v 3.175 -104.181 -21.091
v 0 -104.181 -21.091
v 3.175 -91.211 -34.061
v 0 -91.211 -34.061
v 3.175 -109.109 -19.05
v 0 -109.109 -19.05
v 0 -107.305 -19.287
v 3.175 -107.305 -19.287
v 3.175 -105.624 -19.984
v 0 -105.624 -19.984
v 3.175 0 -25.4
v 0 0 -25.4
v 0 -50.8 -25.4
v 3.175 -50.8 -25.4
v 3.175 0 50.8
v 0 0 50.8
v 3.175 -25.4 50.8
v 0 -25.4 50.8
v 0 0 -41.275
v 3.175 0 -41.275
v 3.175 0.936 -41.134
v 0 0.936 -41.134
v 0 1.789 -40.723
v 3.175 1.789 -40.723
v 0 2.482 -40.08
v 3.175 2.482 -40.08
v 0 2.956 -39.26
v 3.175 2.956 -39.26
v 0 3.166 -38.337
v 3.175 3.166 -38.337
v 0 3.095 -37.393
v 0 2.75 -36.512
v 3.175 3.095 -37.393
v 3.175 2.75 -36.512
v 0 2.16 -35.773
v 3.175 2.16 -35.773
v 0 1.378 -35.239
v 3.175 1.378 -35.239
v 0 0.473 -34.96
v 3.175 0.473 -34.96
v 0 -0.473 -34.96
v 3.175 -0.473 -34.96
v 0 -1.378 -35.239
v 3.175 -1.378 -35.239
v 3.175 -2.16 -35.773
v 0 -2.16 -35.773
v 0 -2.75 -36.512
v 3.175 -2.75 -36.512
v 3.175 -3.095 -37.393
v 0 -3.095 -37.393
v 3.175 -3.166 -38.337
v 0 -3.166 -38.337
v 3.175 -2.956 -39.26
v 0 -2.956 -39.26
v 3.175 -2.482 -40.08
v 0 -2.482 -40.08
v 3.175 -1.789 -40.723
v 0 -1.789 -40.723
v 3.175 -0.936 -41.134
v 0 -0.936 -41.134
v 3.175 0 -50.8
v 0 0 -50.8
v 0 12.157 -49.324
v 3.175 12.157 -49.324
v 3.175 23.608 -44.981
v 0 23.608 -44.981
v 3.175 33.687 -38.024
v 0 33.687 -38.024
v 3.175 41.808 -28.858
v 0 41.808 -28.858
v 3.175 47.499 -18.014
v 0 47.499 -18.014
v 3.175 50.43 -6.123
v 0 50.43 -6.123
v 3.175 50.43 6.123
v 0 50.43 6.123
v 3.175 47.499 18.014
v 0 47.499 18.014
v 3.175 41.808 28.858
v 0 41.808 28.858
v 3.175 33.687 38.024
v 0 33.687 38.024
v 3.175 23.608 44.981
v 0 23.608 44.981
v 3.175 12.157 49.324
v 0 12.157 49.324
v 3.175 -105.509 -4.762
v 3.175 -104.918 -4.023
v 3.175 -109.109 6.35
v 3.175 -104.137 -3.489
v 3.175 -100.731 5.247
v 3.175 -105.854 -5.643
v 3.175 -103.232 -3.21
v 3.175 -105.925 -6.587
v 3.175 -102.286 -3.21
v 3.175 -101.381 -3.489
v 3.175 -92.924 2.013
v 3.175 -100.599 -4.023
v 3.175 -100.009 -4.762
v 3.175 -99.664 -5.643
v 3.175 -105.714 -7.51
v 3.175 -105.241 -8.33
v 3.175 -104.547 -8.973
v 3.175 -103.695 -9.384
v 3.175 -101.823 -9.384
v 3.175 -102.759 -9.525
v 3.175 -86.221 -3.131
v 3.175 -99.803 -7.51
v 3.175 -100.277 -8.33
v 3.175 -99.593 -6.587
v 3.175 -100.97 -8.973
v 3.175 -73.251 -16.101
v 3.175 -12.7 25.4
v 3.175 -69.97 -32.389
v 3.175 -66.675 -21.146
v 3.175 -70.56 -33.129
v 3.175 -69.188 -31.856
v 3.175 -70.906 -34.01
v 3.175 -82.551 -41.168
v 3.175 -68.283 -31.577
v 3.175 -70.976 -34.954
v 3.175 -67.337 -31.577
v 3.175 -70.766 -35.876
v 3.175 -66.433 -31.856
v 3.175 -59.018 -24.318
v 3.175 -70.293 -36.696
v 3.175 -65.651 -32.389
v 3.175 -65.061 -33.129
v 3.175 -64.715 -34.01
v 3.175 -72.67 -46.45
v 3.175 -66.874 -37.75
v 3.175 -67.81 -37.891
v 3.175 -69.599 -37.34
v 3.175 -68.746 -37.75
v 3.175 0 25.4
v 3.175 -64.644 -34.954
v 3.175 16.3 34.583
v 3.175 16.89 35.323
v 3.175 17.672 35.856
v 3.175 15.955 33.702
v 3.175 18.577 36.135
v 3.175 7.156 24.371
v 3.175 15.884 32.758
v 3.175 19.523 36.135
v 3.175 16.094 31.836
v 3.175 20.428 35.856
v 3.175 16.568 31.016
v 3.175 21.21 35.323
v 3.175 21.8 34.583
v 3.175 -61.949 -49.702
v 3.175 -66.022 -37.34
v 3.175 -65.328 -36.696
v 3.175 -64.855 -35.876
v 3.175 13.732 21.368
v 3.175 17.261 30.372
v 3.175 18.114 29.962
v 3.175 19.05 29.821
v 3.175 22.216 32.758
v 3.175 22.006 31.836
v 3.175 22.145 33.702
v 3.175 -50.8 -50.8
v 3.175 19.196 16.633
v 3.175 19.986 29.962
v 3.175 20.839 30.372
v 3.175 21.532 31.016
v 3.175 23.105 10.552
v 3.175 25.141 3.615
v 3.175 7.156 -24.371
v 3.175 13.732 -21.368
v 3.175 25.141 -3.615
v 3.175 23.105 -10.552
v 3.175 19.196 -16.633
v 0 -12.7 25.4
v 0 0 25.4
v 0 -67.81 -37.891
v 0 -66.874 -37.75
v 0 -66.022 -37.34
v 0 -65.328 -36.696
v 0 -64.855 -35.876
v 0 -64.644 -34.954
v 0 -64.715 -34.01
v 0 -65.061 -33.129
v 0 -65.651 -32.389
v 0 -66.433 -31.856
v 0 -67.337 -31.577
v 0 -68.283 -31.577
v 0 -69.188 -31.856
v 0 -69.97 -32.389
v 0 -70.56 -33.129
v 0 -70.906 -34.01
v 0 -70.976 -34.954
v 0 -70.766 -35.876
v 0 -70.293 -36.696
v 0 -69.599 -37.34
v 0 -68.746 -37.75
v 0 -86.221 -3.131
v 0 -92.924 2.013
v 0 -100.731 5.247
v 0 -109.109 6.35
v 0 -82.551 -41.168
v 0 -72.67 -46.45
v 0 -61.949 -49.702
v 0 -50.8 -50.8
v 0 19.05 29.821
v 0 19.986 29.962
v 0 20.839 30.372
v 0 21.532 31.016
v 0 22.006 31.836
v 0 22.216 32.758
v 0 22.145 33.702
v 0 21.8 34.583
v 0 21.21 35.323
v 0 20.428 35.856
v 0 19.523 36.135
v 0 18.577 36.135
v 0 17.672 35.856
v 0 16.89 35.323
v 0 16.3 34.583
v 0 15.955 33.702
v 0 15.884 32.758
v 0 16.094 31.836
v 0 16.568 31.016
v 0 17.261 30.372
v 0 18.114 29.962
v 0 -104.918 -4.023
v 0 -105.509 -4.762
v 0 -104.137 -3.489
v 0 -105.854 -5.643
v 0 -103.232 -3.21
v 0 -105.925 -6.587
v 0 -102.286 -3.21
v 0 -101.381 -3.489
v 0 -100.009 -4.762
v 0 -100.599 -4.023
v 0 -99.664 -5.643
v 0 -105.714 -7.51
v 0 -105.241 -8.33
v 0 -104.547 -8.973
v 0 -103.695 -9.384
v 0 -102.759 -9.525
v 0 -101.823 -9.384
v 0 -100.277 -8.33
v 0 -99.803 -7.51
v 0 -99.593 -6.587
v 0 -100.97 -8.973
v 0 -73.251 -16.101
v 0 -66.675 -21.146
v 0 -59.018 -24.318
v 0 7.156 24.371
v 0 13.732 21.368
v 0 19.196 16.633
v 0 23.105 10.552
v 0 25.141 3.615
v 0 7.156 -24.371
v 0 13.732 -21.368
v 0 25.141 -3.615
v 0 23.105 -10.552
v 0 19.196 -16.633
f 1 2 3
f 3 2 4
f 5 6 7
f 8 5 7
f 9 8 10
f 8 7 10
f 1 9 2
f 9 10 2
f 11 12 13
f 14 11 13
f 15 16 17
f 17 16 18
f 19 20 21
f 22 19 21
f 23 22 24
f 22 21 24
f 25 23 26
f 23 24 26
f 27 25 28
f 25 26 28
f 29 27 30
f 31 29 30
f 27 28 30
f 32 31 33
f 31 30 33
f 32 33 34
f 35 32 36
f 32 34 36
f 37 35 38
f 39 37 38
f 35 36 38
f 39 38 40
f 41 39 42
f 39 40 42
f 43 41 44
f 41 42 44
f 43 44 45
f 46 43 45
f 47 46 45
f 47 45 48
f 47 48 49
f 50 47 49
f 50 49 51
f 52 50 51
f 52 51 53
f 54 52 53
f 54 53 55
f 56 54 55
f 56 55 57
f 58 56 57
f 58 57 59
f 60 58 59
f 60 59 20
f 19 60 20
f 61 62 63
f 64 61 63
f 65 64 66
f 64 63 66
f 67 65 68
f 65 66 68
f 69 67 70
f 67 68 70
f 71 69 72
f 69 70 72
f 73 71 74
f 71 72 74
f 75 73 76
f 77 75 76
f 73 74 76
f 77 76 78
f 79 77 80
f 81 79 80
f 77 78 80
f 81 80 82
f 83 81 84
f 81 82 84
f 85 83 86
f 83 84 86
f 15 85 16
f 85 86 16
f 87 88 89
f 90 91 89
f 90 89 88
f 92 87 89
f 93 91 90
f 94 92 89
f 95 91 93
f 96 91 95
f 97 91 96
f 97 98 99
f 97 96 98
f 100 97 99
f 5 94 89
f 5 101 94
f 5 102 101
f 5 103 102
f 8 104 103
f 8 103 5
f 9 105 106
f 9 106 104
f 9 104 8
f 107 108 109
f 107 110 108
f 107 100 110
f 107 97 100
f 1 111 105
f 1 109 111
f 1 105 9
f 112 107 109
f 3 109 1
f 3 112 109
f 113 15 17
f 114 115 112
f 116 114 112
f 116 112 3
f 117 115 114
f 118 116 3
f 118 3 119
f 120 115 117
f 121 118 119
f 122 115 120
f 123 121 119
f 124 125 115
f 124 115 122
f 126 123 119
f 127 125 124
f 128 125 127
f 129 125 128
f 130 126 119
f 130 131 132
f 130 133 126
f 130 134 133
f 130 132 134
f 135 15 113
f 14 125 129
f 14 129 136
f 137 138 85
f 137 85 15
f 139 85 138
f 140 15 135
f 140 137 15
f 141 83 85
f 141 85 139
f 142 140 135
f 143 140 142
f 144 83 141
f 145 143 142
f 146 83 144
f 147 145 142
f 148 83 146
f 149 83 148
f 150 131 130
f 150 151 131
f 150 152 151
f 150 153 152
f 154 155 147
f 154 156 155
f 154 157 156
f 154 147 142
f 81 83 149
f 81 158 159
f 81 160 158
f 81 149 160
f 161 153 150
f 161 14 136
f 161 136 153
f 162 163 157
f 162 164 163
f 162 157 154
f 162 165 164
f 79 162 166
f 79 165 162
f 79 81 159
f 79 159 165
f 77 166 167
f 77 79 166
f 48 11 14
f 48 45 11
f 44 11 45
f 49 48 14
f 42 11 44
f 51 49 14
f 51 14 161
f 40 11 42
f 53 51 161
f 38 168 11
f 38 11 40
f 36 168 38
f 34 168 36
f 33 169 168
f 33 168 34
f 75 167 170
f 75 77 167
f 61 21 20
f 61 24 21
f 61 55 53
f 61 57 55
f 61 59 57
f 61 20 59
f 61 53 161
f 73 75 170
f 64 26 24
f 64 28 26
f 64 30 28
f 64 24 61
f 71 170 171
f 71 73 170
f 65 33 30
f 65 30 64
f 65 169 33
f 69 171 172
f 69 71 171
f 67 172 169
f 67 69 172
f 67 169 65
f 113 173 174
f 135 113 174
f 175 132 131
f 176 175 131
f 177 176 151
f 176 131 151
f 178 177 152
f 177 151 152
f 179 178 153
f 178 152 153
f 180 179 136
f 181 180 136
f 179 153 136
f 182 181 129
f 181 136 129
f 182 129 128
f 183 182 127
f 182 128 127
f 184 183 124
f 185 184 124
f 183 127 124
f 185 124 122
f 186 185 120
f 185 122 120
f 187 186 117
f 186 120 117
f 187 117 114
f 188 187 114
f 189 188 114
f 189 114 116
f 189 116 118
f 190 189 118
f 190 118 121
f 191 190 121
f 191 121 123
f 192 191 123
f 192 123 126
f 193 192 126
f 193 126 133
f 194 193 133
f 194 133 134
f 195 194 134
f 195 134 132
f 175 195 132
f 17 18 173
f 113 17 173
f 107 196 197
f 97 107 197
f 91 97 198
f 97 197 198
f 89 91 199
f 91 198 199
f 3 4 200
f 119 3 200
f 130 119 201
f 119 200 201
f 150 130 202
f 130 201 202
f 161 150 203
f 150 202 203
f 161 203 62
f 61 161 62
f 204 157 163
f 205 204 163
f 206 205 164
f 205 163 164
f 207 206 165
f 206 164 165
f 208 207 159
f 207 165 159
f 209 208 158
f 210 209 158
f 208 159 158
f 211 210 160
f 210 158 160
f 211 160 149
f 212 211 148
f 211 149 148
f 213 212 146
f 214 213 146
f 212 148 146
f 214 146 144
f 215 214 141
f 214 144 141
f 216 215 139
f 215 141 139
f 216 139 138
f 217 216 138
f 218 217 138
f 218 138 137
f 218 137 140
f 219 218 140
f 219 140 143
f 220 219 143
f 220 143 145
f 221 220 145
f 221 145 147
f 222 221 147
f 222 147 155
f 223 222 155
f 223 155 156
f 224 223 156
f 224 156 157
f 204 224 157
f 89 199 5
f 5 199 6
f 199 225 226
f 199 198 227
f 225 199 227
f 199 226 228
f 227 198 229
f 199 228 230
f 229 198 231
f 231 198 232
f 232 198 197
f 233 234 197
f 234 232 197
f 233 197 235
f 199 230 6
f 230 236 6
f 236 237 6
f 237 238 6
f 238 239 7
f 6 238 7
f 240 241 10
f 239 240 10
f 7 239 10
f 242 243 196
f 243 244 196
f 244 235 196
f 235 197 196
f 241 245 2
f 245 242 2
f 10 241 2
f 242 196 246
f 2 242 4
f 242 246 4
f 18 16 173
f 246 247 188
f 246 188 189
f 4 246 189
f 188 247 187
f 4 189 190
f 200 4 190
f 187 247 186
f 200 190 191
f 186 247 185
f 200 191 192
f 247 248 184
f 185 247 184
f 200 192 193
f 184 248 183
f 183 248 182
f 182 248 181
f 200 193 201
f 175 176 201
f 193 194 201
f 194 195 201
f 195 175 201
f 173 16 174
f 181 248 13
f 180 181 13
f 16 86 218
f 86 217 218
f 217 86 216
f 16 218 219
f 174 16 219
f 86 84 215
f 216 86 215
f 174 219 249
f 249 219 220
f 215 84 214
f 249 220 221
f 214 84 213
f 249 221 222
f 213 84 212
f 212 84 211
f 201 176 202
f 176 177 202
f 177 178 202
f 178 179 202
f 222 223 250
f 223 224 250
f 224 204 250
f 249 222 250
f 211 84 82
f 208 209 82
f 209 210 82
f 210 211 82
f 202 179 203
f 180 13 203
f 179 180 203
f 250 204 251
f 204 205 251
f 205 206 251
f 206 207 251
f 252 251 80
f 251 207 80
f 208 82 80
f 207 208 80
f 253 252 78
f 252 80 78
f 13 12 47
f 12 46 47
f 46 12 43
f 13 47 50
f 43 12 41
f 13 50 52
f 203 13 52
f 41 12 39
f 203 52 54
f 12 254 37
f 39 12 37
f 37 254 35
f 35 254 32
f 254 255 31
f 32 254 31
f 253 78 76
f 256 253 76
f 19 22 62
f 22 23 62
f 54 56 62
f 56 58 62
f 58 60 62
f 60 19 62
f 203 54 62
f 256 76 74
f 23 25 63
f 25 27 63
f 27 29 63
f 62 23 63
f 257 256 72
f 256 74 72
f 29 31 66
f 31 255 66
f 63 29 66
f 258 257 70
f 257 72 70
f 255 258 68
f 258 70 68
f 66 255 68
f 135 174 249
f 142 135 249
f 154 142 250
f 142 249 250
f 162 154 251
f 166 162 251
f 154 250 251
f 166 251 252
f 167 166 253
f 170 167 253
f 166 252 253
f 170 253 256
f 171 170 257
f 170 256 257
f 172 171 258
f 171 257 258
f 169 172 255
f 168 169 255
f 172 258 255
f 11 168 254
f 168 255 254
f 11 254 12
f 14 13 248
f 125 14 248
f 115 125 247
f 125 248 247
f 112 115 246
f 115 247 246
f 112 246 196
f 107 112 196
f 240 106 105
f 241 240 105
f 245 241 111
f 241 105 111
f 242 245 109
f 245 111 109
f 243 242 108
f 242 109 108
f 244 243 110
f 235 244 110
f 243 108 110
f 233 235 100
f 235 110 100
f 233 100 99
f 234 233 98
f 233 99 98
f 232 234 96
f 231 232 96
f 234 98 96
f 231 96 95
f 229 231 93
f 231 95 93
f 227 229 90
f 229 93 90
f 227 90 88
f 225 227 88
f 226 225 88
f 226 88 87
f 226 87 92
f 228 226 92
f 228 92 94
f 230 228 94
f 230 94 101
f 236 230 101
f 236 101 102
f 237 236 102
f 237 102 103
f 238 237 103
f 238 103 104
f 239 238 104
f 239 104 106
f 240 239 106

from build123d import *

# Parameters (mm, degrees)
BOSS_EXTRUDE1_DEPTH = 3.175
SKETCH2_R           = 3.175
CUT_EXTRUDE1_DEPTH  = 4.175


with BuildPart() as part:
    # Sketch1 → Boss-Extrude1 (new body)
    with BuildSketch(Plane(origin=(0, 0, 0), x_dir=(0, 0, -1), z_dir=(1, 0, 0))):
        with BuildLine():
            Line((-50.8, 0), (-50.8, -25.4))
            Line((-50.8, -25.4), (-25.4, -12.7))
            Line((-25.4, -12.7), (-25.4, 0))
            ThreePointArc((-25.4, 0), (0, 25.4), (25.4, 0))
            Line((25.4, 0), (25.4, -50.8))
            ThreePointArc((25.4, -50.8), (22.983175157, -62.950198978), (16.100640303, -73.250640303))
            Line((16.100640303, -73.250640303), (3.130634922, -86.220645683))
            ThreePointArc((3.130634922, -86.220645683), (-3.886063261, -96.721876619), (-6.35, -109.108923092))
            Line((-6.35, -109.108923092), (19.05, -109.108923092))
            ThreePointArc((19.05, -109.108923092), (19.580476865, -106.442035801), (21.091147164, -104.181157925))
            Line((21.091147164, -104.181157925), (34.061152545, -91.211152545))
            ThreePointArc((34.061152545, -91.211152545), (46.449715283, -72.67035816), (50.8, -50.8))
            Line((50.8, -50.8), (50.8, 0))
            ThreePointArc((50.8, 0), (0, 50.8), (-50.8, 0))
        make_face()
    extrude(amount=BOSS_EXTRUDE1_DEPTH)

    # Sketch2 → Cut-Extrude1 (cut, through all)
    with BuildSketch(Plane(origin=(3.175, 0, 0), x_dir=(0, 0, -1), z_dir=(1, 0, 0))):
        with Locations((38.1, 0)):
            Circle(SKETCH2_R)
        with Locations((-32.995567884, 19.05)):
            Circle(SKETCH2_R)
        with Locations((34.71644522, -67.810278569)):
            Circle(SKETCH2_R)
        with Locations((6.35, -102.758923092)):
            Circle(SKETCH2_R)
    extrude(amount=-CUT_EXTRUDE1_DEPTH, mode=Mode.SUBTRACT)


solid = part.part
